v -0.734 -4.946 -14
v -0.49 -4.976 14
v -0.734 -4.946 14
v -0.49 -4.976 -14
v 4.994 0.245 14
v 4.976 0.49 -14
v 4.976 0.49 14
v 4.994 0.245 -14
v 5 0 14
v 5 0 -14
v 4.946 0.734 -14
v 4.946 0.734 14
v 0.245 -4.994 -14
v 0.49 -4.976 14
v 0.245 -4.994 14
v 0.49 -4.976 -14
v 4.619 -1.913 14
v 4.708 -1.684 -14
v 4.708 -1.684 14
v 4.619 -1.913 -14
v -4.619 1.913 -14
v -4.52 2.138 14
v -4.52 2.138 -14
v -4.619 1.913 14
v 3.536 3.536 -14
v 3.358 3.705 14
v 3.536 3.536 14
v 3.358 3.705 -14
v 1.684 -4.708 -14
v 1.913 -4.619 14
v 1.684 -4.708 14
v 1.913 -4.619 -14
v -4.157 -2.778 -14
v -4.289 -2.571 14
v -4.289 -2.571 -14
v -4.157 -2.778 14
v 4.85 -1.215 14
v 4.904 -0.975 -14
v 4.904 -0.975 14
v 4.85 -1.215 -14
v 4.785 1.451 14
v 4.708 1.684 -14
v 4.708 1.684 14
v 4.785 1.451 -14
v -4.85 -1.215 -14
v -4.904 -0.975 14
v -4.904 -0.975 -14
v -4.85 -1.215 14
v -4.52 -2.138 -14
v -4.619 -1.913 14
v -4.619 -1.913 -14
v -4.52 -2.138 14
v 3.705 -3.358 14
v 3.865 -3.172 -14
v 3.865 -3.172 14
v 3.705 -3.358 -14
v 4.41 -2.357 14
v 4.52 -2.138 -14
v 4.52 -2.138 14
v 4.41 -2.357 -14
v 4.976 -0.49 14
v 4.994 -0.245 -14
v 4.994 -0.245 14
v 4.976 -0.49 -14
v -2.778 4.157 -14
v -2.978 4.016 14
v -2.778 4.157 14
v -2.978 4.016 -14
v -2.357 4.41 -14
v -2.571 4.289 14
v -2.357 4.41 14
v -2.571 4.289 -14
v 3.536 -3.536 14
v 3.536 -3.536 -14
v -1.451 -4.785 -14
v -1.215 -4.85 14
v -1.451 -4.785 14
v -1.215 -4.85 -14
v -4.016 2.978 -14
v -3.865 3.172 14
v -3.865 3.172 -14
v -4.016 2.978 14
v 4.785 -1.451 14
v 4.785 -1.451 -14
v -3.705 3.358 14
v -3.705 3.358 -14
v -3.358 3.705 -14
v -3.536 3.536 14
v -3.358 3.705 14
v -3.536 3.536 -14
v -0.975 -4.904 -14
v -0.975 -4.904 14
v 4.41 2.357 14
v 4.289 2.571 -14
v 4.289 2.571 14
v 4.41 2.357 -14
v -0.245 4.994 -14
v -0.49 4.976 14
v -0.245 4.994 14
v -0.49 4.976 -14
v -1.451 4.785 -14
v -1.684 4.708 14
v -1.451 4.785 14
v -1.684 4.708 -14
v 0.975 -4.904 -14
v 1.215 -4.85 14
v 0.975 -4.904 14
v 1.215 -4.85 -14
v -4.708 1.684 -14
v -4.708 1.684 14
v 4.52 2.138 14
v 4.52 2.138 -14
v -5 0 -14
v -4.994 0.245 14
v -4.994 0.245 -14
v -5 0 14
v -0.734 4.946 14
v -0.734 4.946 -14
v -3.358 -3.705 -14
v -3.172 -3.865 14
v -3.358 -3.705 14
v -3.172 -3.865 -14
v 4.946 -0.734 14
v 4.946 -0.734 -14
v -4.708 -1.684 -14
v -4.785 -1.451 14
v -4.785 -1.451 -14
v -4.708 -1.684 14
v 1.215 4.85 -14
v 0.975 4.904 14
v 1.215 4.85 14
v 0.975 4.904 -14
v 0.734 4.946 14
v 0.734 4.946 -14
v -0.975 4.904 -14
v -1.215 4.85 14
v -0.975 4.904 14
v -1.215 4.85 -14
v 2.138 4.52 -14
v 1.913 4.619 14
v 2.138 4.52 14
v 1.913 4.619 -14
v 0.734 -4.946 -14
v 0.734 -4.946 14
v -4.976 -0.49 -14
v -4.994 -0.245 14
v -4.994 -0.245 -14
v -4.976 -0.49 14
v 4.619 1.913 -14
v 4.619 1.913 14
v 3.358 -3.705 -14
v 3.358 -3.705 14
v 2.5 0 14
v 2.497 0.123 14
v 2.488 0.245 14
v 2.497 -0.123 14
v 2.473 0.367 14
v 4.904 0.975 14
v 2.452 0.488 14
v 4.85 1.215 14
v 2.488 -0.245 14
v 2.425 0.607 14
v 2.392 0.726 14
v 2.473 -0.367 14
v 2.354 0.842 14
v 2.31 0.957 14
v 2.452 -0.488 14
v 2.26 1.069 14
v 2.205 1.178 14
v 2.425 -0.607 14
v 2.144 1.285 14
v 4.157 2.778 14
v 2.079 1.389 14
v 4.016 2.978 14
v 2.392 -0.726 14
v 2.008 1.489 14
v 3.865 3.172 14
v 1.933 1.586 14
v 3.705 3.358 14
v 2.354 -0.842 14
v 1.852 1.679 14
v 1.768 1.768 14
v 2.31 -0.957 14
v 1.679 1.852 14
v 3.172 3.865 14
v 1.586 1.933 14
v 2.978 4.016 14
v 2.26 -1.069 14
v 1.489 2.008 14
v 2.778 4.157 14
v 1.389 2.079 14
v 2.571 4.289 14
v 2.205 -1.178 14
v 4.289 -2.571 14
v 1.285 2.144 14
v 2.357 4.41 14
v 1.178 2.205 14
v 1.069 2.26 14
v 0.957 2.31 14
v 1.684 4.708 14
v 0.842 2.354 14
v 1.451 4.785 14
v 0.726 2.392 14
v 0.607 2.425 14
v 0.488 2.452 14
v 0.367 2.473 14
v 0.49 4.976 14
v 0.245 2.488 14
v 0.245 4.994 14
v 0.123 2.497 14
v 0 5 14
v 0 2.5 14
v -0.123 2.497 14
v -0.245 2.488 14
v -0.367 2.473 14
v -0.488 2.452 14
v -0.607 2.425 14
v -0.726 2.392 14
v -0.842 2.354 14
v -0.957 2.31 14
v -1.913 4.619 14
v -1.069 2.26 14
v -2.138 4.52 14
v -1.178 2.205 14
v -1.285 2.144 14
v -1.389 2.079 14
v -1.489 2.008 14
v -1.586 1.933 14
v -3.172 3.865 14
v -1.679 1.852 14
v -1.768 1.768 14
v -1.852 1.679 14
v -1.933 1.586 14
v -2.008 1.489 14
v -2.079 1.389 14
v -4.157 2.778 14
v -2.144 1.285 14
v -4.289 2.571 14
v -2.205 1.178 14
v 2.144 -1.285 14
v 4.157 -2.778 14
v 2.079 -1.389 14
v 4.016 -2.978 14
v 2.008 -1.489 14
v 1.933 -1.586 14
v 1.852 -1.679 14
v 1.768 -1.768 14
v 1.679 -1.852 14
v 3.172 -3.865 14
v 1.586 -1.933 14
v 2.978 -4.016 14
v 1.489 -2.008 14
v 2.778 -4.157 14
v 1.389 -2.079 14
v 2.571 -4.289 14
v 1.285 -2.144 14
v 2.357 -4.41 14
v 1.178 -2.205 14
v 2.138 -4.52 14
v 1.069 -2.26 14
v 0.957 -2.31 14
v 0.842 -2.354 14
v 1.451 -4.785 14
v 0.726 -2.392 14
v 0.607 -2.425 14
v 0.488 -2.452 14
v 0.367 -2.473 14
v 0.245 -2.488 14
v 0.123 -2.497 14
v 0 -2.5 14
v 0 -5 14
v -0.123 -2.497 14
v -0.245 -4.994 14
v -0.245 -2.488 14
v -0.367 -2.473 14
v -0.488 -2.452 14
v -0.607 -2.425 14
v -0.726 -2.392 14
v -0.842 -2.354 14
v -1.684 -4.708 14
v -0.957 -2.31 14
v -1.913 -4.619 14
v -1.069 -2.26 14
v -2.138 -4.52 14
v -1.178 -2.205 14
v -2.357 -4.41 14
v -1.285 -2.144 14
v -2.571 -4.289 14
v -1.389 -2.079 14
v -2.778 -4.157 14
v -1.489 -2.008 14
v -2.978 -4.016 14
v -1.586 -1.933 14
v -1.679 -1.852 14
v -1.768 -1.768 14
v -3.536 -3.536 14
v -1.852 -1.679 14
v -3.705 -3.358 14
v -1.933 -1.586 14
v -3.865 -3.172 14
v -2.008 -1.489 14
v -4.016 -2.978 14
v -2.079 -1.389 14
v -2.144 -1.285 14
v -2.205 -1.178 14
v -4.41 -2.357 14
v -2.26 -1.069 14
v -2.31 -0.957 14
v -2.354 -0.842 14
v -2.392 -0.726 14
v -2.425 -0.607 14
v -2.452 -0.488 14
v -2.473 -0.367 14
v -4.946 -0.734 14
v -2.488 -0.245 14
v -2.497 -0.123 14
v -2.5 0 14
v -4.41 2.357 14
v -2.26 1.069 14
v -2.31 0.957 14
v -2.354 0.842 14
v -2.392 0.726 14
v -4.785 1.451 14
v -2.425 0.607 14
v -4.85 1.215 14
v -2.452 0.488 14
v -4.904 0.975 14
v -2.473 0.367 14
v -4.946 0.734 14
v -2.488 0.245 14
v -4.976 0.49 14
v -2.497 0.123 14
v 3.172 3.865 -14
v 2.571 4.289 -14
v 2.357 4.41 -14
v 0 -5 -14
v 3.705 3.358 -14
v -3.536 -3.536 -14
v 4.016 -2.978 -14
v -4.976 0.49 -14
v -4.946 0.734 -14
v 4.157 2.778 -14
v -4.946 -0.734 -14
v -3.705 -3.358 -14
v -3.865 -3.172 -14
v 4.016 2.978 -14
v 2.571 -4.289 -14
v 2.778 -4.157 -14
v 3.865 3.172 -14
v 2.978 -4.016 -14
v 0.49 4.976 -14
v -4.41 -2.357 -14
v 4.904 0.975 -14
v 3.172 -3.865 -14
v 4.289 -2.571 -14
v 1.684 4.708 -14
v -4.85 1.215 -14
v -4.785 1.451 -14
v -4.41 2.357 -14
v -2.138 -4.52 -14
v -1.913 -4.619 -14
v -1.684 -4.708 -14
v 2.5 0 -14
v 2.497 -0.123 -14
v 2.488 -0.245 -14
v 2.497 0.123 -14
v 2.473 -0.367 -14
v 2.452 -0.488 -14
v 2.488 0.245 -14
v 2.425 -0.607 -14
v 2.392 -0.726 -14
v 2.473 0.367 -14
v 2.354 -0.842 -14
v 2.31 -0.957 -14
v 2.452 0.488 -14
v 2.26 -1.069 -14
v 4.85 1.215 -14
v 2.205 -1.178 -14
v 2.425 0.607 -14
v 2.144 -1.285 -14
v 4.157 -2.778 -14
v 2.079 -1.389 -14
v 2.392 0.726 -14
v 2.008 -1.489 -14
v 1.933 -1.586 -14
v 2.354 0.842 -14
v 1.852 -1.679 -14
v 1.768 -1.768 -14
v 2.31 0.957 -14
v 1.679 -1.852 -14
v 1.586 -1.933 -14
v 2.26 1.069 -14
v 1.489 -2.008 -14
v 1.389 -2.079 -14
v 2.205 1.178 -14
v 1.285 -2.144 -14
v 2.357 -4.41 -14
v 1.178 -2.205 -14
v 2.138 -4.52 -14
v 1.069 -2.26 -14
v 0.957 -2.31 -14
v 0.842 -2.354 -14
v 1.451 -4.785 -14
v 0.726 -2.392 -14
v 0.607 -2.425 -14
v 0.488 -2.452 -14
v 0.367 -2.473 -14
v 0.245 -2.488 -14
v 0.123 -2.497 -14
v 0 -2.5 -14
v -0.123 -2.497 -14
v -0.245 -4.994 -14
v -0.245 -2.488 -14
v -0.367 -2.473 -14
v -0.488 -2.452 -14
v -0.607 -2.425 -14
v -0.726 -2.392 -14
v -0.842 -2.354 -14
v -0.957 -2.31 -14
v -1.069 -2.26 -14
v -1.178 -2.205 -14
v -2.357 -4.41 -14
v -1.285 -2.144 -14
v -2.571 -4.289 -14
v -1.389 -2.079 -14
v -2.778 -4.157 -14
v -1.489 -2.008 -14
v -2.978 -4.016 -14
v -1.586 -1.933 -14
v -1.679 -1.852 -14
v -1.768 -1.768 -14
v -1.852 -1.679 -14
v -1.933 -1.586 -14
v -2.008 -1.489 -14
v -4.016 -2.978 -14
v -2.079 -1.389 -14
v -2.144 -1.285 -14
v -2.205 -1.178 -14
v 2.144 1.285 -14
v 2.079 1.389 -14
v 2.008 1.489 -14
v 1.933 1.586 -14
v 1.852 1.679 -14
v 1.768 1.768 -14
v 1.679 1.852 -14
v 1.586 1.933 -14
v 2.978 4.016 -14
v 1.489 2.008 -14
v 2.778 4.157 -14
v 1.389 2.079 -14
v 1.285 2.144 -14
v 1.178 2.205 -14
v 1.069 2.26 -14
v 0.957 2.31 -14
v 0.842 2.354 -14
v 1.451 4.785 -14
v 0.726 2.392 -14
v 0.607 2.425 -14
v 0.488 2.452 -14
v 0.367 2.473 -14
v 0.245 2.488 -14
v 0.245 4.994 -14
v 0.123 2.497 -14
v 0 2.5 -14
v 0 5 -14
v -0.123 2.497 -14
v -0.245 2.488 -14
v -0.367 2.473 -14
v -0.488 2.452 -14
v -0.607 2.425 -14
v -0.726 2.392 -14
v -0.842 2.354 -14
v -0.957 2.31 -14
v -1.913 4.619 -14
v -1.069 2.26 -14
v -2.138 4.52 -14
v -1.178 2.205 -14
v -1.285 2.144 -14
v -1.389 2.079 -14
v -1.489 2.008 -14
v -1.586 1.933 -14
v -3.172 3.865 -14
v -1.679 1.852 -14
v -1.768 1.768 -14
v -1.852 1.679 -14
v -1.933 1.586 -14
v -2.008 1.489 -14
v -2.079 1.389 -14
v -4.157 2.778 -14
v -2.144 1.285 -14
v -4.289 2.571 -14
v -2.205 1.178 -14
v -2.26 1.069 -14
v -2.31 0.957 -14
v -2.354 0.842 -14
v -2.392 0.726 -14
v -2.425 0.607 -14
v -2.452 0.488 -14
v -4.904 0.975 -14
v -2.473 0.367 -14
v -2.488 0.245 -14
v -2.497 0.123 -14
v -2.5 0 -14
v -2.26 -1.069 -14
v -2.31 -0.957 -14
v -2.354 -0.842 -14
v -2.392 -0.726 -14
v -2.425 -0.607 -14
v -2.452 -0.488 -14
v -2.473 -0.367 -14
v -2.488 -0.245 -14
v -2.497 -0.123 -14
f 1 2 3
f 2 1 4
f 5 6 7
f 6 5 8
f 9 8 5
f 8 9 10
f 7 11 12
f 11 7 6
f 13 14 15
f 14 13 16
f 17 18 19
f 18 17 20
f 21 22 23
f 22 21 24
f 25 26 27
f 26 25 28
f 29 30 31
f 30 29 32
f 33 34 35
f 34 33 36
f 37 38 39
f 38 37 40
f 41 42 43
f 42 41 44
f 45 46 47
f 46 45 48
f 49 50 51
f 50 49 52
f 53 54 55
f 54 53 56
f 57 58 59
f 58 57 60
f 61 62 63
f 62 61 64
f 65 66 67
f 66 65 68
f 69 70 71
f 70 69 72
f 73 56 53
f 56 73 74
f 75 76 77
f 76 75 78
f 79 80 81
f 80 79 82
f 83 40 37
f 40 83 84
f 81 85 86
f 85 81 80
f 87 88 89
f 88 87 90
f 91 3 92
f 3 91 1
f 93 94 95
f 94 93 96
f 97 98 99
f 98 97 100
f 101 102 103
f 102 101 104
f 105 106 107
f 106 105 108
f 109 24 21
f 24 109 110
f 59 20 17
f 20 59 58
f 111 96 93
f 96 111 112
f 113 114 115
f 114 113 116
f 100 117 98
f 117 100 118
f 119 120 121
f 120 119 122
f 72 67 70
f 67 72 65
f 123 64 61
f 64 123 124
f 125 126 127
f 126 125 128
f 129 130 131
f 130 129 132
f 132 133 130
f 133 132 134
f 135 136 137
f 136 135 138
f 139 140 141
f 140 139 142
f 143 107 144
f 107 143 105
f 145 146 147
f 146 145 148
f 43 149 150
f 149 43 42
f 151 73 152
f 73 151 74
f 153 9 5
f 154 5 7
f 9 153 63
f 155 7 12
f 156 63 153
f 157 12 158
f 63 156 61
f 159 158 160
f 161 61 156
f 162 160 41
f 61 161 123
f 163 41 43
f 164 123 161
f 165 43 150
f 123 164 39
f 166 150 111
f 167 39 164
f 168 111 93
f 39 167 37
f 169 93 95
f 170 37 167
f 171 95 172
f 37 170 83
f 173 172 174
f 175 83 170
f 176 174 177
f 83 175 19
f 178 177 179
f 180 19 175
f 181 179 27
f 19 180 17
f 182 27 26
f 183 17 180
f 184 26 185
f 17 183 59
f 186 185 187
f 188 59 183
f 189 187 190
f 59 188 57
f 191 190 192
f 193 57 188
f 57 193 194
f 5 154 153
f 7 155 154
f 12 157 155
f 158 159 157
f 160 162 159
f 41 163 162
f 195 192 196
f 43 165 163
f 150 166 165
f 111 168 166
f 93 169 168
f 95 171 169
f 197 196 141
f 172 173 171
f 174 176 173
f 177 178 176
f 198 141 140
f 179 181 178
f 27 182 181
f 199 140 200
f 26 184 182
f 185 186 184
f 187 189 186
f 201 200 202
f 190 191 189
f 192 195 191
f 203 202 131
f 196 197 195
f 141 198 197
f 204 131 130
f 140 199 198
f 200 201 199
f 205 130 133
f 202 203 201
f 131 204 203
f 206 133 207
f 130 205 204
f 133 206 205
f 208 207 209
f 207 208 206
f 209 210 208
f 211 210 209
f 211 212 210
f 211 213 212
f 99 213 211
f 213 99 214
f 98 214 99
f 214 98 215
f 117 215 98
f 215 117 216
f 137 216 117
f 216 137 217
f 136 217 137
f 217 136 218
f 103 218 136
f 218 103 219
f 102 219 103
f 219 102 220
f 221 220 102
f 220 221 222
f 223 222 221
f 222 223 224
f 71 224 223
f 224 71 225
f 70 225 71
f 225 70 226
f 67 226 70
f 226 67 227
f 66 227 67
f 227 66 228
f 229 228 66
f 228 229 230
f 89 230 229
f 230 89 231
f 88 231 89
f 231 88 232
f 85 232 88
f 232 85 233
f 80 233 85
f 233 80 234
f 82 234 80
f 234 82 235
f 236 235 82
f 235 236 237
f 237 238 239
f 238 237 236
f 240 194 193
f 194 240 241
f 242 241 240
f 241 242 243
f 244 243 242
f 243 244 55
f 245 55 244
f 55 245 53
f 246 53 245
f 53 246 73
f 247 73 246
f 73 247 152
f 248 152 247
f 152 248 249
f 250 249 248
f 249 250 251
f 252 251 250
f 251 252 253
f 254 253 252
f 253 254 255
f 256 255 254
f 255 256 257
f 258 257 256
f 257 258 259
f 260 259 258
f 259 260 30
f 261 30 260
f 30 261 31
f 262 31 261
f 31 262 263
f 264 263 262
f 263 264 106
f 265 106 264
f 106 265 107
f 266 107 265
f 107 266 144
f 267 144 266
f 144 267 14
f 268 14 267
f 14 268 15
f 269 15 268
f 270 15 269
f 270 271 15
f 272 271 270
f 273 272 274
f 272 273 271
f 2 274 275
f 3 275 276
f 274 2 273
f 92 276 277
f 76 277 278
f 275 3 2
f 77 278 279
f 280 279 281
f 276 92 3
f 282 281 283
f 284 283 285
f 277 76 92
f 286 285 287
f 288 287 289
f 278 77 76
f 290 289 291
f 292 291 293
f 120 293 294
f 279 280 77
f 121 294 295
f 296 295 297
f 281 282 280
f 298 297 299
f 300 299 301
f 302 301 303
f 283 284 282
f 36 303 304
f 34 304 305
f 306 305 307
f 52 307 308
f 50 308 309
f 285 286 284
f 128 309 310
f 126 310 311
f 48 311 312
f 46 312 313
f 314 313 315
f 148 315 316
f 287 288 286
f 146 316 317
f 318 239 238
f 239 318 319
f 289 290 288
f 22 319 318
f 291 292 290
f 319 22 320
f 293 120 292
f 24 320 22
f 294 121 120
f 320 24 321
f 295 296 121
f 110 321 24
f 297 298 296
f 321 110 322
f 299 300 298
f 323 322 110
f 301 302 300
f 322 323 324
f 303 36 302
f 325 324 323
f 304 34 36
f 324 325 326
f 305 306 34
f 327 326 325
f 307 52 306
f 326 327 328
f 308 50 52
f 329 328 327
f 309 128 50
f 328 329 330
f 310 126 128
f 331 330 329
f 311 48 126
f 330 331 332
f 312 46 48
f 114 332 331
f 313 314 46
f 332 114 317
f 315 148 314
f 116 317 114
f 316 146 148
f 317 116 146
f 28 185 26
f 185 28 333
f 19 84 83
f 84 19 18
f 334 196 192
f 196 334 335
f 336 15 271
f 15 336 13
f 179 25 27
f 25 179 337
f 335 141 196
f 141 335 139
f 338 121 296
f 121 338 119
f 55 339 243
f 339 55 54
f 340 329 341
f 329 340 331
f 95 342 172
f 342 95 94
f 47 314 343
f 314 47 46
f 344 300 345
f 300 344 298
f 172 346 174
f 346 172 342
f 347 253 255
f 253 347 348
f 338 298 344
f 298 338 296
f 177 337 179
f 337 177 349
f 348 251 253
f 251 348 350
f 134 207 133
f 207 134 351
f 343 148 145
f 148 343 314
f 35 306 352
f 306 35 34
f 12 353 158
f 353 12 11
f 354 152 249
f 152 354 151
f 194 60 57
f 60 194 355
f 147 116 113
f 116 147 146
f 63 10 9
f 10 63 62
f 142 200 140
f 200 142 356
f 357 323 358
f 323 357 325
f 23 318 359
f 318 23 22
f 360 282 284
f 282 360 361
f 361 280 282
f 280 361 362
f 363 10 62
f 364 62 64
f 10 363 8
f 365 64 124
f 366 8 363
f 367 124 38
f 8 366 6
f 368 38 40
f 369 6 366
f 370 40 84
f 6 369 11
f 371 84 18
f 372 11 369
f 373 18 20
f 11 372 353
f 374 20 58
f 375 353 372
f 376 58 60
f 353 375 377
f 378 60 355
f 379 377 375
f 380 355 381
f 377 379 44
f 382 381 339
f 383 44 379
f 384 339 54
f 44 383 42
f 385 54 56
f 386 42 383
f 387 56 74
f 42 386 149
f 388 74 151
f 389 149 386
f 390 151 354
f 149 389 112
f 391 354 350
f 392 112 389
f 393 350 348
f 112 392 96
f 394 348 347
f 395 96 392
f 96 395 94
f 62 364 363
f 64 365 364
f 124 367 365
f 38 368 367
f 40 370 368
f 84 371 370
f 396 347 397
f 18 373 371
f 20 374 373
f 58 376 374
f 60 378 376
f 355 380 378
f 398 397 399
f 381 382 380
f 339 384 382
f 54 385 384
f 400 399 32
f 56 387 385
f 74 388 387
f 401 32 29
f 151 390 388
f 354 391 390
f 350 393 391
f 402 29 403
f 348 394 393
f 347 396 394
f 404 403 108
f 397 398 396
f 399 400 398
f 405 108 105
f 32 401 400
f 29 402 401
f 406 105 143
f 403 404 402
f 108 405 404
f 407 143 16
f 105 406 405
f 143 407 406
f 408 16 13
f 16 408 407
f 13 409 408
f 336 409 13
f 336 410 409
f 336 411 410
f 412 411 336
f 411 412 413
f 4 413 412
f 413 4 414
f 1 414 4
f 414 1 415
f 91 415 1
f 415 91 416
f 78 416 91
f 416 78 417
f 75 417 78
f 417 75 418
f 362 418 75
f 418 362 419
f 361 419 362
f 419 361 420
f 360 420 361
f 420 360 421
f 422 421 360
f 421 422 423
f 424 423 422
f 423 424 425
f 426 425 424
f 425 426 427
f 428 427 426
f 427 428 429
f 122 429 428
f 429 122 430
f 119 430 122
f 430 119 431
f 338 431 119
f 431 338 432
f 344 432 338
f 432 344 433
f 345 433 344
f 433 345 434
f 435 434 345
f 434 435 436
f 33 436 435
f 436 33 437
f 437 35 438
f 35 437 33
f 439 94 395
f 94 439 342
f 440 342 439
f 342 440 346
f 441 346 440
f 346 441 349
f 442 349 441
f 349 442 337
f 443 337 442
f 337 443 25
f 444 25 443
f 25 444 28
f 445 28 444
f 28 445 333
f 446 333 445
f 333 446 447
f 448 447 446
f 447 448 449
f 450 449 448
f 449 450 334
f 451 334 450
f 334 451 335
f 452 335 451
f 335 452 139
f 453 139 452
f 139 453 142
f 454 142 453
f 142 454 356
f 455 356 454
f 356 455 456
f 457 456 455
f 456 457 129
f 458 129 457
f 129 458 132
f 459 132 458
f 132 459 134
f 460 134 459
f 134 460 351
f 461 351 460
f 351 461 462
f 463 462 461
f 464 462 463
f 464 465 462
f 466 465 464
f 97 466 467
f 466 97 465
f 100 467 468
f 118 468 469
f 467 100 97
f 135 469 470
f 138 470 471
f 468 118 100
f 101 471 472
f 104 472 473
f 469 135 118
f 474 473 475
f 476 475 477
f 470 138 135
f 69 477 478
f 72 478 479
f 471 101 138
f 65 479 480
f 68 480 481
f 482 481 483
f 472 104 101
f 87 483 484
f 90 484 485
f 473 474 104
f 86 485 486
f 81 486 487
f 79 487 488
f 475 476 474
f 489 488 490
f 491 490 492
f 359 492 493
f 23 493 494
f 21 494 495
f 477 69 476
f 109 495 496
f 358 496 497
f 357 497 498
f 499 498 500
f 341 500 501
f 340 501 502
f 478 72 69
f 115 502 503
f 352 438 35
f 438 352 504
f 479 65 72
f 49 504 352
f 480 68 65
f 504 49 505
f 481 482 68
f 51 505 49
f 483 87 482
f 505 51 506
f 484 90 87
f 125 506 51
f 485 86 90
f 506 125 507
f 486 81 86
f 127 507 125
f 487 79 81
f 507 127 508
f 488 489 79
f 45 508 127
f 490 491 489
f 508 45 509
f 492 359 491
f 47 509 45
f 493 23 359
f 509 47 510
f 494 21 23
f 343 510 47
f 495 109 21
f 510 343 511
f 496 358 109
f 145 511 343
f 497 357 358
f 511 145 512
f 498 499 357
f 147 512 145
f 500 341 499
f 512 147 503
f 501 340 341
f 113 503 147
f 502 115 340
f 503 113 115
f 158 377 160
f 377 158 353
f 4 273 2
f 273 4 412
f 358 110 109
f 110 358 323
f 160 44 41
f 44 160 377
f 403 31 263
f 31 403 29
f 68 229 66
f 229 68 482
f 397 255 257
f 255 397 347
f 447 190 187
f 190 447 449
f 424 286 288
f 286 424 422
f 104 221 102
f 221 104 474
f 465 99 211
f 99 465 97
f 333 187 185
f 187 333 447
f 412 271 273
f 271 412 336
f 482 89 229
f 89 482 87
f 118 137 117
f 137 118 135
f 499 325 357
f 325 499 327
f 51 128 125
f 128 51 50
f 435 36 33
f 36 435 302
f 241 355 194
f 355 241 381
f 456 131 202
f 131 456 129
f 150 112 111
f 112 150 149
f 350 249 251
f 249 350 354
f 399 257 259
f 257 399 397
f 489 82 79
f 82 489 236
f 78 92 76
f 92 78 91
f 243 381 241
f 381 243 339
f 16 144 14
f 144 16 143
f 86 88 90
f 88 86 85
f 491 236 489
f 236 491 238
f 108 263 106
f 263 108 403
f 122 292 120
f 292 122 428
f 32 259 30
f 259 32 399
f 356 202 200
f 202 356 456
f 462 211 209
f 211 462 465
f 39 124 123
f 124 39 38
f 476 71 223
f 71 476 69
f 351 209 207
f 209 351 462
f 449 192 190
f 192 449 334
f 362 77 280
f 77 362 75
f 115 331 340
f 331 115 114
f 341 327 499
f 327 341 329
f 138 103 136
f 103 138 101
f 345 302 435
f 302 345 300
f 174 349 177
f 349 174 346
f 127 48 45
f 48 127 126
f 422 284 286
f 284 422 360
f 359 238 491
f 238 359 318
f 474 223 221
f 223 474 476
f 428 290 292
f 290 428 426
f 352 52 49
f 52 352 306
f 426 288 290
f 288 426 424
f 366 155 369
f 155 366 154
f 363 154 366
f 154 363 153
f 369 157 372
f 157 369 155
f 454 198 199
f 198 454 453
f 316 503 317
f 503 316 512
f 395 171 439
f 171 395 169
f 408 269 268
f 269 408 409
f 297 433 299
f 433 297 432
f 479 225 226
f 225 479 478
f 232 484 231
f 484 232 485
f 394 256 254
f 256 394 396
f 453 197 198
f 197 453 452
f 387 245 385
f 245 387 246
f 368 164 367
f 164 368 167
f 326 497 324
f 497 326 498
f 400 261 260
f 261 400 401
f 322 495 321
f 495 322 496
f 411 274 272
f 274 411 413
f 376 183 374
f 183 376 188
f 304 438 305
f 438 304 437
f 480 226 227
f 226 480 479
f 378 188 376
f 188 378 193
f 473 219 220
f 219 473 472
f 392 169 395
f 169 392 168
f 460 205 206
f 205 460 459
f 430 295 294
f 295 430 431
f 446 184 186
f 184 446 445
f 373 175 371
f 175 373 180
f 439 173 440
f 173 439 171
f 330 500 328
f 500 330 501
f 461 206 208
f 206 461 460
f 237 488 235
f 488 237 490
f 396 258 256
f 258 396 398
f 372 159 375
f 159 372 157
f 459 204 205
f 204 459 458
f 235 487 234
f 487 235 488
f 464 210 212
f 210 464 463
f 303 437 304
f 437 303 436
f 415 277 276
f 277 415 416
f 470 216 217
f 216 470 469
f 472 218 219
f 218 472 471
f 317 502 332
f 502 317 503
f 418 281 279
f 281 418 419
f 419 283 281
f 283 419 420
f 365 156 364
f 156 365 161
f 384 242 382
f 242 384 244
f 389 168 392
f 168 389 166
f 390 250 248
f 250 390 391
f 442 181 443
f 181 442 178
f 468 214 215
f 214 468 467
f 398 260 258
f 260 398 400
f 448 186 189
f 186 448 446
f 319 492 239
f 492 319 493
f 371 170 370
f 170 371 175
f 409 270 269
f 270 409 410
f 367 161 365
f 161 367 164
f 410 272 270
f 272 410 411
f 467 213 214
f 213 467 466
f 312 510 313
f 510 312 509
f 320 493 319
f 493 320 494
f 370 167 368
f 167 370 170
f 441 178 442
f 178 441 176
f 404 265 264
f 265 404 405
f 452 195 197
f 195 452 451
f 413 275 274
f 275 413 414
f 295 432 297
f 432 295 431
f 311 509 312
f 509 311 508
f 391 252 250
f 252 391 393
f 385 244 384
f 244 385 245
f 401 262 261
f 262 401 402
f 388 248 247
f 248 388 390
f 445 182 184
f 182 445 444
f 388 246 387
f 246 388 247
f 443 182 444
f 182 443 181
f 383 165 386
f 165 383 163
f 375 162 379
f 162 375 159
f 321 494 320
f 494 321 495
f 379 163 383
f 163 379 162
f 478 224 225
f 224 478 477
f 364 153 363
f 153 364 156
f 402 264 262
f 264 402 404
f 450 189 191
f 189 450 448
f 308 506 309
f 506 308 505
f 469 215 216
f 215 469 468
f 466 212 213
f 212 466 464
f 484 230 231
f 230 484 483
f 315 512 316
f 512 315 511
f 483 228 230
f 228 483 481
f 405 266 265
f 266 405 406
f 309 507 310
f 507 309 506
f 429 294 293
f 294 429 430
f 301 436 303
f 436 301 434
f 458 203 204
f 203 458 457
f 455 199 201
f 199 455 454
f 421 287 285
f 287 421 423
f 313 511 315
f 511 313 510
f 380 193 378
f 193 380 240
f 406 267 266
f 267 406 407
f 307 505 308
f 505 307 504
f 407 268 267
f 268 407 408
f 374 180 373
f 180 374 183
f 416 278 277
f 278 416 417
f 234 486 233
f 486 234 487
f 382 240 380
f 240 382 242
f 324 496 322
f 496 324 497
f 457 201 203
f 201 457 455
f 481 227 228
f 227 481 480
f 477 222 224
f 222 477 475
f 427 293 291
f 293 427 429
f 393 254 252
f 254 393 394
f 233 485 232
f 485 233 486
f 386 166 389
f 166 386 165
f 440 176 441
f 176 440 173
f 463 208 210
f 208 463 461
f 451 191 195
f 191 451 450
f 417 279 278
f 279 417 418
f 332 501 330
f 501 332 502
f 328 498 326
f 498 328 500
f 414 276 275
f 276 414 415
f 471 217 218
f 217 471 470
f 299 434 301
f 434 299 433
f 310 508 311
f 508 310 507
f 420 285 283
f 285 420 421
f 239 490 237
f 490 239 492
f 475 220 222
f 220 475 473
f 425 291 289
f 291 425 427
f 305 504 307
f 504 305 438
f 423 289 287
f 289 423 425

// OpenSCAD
$fn = 128;

bore_d  = 5.0;
outer_d = 10.0;
len     = 28.0;

eps = 0.02;

difference() {
    // Outer body (OD = 10, length = 28), centered for consistent orthographic views
    cylinder(d = outer_d, h = len, center = true);

    // Through bore (ID = 5), extended slightly to guarantee a clean cut
    cylinder(d = bore_d, h = len + 2*eps, center = true);
}
